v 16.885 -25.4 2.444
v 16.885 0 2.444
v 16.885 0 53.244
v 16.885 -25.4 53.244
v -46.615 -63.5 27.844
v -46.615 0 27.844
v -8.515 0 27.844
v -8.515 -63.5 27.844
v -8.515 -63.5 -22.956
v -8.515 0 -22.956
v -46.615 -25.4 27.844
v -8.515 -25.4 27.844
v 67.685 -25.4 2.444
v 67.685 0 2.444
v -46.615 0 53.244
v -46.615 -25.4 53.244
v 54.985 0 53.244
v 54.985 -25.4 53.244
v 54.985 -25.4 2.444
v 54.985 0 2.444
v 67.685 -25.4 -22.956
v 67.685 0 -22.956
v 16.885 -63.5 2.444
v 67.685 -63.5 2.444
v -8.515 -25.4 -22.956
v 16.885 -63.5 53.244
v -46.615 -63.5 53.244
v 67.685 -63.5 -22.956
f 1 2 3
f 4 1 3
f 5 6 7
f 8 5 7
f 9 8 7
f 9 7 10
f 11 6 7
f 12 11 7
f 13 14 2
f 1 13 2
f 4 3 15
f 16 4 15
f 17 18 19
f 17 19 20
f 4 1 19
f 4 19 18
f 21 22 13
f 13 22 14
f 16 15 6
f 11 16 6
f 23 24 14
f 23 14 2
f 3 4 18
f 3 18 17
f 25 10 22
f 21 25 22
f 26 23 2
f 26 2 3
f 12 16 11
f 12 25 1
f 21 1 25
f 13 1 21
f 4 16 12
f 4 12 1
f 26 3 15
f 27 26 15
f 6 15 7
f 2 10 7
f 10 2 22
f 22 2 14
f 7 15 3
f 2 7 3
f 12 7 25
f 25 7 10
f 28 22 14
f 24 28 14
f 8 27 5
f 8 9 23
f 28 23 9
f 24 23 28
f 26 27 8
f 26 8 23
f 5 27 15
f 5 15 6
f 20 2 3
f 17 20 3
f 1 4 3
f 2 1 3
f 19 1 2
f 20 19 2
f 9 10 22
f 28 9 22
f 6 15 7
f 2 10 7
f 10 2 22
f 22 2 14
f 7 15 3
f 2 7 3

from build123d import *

# Parameters (mm, degrees)
F1_DEPTH = 63.5
F2_DEPTH = 25.4
F3_W     = 25.4
F3_H     = 50.8
F4_DEPTH = 38.1


with BuildPart() as f1:
    # F0 (on Front) → F1 (new body)
    with BuildSketch(Plane.XZ):
        Polygon((16.885137, 53.24405), (-46.614863, 53.24405), (-46.614863, 27.84405), (-8.514863, 27.84405), (-8.514863, -22.95595), (67.685137, -22.95595), (67.685137, 2.44405), (16.885137, 2.44405), align=None)
    extrude(amount=F1_DEPTH)


with BuildPart() as f2:
    # F0 (on Front) → F2 (new body)
    with BuildSketch(Plane.XZ):
        Polygon((16.885137, 53.24405), (-46.614863, 53.24405), (-46.614863, 27.84405), (-8.514863, 27.84405), (-8.514863, -22.95595), (67.685137, -22.95595), (67.685137, 2.44405), (16.885137, 2.44405), align=None)
    extrude(amount=F2_DEPTH)


with BuildPart() as f4:
    # F3 (on face) → F4 (new body)
    with BuildSketch(Plane.YZ.offset(16.885137)):
        with Locations((-12.7, 27.84405)):
            Rectangle(F3_W, F3_H)
    extrude(amount=F4_DEPTH)


solid = Compound([f1.part, f2.part, f4.part])
